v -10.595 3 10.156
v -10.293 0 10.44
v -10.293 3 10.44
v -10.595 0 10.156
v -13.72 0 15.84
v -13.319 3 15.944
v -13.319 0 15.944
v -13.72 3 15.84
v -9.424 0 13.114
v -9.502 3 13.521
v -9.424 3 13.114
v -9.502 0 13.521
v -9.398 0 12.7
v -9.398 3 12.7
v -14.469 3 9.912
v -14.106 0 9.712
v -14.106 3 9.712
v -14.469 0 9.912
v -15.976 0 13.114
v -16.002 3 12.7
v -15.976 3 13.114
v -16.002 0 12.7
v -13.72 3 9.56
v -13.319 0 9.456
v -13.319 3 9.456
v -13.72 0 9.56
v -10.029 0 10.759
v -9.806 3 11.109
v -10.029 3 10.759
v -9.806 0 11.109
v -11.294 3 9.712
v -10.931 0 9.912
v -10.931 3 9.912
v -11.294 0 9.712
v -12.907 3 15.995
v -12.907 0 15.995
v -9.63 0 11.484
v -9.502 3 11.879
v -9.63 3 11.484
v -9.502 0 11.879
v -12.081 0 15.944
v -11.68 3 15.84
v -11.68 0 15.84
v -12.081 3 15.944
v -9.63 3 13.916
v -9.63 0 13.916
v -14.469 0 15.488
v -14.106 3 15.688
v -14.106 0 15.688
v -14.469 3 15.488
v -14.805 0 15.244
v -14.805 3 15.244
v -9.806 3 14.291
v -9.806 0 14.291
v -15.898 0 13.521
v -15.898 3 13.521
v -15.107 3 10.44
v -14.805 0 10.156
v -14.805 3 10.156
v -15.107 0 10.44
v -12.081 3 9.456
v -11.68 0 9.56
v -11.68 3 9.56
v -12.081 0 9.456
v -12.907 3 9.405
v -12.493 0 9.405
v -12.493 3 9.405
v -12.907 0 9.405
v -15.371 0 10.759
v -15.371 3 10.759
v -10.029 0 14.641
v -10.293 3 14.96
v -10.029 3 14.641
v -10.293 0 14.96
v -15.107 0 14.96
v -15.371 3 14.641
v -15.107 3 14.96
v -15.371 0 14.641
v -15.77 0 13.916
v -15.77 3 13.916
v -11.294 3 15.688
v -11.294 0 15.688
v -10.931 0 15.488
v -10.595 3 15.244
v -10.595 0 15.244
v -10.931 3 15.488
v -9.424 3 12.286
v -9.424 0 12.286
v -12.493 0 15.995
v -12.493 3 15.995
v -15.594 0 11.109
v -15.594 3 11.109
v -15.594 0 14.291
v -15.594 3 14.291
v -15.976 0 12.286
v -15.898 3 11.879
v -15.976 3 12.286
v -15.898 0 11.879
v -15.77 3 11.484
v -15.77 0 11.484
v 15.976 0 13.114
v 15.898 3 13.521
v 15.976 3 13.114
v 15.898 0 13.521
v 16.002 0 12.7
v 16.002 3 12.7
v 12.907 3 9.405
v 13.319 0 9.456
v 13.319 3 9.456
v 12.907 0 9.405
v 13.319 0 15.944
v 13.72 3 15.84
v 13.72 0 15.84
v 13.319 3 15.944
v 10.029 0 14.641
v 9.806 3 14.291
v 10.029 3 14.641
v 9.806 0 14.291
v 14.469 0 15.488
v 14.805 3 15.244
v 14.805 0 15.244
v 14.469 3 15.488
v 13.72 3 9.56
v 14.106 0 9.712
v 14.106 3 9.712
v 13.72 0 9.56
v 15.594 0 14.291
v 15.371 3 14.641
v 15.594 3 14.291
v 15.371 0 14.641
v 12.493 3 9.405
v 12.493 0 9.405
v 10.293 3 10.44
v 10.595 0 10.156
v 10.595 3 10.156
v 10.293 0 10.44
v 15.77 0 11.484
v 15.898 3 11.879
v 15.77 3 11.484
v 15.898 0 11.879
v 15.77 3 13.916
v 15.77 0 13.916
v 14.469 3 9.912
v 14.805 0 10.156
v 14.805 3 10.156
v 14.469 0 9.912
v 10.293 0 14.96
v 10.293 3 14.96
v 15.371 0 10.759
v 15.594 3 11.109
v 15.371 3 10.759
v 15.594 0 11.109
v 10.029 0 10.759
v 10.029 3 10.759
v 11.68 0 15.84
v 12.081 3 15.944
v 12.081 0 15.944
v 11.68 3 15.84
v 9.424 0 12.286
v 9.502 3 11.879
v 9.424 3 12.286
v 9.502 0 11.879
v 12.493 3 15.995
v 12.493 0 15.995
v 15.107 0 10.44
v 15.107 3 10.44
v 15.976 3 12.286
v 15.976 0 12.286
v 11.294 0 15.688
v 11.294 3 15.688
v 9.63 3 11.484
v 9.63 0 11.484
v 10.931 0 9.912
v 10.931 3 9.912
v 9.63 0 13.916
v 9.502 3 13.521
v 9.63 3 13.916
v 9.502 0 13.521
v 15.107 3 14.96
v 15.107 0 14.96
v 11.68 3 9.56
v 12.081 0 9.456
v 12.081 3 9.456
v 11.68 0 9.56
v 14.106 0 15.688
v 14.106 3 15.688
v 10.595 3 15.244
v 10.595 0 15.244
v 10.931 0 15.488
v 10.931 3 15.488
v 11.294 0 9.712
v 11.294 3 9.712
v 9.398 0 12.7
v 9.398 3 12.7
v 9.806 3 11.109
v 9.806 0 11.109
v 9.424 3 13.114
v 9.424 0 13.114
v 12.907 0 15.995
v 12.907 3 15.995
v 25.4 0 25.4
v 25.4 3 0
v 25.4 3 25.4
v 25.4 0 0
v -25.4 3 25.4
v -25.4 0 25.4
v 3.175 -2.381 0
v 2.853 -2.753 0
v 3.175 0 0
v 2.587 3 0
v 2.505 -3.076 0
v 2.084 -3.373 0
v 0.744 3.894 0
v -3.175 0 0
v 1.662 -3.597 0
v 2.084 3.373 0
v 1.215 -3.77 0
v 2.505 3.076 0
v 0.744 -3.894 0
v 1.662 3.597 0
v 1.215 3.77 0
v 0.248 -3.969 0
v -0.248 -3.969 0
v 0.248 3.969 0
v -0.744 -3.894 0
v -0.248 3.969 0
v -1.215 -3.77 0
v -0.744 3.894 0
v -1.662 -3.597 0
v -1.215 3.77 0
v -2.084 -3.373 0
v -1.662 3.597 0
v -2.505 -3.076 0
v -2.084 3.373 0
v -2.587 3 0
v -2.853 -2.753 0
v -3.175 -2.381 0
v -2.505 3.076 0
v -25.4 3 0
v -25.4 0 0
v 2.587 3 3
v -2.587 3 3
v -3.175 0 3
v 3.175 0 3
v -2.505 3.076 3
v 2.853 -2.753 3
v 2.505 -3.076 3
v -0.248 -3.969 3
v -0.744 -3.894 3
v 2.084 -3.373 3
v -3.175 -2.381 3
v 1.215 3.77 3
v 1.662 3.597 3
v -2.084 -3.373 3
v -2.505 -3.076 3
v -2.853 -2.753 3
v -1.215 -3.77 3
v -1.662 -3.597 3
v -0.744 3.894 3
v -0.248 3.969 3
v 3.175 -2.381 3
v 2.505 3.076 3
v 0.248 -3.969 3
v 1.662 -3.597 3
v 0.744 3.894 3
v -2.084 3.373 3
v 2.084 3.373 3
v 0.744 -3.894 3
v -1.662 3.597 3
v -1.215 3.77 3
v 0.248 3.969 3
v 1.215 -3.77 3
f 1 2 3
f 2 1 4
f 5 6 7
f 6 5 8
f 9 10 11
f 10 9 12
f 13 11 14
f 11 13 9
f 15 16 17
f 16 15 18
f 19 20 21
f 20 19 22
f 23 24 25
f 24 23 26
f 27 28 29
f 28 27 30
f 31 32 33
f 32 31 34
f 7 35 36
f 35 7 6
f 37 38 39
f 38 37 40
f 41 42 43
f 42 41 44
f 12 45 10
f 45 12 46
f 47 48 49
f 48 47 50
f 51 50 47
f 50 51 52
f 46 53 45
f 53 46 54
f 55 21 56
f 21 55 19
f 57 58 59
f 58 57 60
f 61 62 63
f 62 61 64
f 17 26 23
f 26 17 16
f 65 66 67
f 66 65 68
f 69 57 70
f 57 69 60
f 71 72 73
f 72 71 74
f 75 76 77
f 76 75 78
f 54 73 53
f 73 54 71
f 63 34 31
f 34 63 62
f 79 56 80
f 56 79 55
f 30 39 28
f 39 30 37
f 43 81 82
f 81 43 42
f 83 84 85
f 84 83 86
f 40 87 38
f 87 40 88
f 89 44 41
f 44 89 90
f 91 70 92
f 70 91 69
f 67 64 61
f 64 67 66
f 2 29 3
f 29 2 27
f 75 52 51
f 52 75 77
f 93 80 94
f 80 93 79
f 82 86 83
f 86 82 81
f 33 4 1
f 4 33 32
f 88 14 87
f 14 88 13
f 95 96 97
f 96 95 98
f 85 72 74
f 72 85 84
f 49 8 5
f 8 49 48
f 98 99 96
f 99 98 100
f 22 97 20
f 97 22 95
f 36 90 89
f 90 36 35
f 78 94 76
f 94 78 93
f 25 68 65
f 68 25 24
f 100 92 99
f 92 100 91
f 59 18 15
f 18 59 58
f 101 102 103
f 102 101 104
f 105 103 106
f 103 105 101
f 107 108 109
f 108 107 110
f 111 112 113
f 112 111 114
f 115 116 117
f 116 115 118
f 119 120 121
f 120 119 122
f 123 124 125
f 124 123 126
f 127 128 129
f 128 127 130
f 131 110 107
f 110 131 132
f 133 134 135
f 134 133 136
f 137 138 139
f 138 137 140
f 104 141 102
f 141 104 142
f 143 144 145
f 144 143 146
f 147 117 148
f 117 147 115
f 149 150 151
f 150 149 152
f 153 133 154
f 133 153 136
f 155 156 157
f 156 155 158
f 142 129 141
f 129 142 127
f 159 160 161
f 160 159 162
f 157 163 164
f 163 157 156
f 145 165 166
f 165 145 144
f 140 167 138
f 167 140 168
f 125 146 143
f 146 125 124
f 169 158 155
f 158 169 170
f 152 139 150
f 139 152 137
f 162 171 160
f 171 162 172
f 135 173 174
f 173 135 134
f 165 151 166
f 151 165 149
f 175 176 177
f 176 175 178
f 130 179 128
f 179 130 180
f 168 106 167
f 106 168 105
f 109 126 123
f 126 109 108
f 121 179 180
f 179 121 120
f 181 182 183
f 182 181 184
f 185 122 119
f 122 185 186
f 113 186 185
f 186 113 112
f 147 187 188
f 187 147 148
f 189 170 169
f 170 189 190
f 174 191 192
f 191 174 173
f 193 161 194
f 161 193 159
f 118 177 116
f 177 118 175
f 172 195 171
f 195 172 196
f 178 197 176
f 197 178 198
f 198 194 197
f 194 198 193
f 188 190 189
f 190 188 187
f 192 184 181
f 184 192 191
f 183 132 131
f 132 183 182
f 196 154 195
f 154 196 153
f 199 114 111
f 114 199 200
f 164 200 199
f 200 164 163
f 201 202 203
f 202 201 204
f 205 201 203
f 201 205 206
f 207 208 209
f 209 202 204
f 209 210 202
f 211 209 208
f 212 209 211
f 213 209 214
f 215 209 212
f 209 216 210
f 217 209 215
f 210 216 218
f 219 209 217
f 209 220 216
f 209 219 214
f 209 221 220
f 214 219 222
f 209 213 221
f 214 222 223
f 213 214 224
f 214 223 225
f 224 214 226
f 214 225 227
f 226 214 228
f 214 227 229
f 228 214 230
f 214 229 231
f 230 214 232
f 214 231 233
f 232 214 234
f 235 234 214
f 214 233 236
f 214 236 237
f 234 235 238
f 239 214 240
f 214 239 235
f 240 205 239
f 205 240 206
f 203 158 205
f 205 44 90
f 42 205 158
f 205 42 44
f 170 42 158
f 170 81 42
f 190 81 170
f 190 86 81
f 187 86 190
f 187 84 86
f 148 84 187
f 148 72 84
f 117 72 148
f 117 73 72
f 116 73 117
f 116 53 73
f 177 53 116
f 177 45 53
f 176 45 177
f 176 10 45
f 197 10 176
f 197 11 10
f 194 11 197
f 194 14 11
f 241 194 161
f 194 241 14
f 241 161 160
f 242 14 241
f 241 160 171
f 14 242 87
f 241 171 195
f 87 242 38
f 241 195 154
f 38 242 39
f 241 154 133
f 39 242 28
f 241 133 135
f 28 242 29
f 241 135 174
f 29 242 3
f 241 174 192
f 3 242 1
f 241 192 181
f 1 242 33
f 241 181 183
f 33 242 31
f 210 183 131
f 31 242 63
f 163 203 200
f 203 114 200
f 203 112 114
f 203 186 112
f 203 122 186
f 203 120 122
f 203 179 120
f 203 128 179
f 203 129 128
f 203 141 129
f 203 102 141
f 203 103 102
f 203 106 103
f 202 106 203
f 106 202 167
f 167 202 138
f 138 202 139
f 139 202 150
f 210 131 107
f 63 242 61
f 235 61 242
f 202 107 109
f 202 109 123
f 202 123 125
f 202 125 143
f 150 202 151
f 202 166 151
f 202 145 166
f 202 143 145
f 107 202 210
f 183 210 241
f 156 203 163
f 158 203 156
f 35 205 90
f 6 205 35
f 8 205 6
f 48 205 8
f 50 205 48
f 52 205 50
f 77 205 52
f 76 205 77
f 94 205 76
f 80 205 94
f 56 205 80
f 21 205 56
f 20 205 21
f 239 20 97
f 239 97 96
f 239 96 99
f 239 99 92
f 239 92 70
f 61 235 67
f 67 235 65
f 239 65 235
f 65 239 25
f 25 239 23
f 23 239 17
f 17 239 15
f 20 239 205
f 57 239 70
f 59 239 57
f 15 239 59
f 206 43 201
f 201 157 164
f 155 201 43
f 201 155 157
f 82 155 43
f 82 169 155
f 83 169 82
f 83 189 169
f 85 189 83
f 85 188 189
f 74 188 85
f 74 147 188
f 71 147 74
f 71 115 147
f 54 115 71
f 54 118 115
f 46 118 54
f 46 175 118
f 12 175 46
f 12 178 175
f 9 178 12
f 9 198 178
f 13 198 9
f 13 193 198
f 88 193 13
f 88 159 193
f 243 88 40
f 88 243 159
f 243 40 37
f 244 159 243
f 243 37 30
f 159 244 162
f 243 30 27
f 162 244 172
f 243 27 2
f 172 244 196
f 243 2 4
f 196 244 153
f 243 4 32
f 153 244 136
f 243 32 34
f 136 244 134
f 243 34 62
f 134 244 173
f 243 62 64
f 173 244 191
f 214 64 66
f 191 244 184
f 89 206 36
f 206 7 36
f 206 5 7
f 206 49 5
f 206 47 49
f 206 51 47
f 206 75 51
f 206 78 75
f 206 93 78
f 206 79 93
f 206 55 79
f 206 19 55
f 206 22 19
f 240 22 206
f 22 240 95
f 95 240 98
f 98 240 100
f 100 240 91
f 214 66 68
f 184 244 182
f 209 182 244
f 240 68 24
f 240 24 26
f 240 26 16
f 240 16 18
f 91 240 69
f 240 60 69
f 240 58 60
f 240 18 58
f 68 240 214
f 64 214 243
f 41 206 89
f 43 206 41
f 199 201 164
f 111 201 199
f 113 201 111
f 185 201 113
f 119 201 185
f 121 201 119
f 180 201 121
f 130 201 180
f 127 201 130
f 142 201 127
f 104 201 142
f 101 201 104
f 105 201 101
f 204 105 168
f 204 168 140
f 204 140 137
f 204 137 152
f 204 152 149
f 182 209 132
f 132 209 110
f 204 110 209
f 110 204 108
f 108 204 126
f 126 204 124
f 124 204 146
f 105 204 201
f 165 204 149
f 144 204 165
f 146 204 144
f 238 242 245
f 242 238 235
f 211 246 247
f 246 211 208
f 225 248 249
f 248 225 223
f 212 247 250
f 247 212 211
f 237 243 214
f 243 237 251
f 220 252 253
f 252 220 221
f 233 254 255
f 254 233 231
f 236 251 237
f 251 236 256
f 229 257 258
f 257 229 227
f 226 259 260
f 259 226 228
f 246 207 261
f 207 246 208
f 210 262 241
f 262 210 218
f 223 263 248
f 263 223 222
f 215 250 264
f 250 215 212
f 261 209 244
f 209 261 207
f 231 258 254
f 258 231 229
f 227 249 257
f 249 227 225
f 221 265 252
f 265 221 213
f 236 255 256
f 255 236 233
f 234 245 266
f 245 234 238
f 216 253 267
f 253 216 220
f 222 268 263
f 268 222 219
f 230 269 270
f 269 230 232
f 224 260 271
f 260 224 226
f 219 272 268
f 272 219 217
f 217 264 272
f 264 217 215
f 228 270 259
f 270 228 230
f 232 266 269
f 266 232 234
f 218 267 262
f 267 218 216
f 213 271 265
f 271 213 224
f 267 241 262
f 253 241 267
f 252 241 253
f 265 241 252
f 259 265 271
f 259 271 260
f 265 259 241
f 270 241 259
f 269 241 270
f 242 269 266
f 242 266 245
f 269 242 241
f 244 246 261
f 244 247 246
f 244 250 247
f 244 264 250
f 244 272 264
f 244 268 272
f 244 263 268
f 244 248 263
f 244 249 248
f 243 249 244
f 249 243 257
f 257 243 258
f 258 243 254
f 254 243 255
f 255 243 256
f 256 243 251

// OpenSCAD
$fn=50;
inch = 25.4;

linear_extrude(3)
scale([inch, inch, 0]) 
import("./banana.dxf");

difference() {

translate([-1*inch, 0, 0]) 
cube([2*inch, 3, 1*inch]);

union() {
   
translate([-0.5*inch, 0, 0.5*inch])
rotate([90, 0, 0])
cylinder(10, 0.13*inch, 0.13*inch, center=true);

translate([0.5*inch, 0, 0.5*inch])
rotate([90, 0, 0])
cylinder(10, 0.13*inch, 0.13*inch, center=true);

}
}
